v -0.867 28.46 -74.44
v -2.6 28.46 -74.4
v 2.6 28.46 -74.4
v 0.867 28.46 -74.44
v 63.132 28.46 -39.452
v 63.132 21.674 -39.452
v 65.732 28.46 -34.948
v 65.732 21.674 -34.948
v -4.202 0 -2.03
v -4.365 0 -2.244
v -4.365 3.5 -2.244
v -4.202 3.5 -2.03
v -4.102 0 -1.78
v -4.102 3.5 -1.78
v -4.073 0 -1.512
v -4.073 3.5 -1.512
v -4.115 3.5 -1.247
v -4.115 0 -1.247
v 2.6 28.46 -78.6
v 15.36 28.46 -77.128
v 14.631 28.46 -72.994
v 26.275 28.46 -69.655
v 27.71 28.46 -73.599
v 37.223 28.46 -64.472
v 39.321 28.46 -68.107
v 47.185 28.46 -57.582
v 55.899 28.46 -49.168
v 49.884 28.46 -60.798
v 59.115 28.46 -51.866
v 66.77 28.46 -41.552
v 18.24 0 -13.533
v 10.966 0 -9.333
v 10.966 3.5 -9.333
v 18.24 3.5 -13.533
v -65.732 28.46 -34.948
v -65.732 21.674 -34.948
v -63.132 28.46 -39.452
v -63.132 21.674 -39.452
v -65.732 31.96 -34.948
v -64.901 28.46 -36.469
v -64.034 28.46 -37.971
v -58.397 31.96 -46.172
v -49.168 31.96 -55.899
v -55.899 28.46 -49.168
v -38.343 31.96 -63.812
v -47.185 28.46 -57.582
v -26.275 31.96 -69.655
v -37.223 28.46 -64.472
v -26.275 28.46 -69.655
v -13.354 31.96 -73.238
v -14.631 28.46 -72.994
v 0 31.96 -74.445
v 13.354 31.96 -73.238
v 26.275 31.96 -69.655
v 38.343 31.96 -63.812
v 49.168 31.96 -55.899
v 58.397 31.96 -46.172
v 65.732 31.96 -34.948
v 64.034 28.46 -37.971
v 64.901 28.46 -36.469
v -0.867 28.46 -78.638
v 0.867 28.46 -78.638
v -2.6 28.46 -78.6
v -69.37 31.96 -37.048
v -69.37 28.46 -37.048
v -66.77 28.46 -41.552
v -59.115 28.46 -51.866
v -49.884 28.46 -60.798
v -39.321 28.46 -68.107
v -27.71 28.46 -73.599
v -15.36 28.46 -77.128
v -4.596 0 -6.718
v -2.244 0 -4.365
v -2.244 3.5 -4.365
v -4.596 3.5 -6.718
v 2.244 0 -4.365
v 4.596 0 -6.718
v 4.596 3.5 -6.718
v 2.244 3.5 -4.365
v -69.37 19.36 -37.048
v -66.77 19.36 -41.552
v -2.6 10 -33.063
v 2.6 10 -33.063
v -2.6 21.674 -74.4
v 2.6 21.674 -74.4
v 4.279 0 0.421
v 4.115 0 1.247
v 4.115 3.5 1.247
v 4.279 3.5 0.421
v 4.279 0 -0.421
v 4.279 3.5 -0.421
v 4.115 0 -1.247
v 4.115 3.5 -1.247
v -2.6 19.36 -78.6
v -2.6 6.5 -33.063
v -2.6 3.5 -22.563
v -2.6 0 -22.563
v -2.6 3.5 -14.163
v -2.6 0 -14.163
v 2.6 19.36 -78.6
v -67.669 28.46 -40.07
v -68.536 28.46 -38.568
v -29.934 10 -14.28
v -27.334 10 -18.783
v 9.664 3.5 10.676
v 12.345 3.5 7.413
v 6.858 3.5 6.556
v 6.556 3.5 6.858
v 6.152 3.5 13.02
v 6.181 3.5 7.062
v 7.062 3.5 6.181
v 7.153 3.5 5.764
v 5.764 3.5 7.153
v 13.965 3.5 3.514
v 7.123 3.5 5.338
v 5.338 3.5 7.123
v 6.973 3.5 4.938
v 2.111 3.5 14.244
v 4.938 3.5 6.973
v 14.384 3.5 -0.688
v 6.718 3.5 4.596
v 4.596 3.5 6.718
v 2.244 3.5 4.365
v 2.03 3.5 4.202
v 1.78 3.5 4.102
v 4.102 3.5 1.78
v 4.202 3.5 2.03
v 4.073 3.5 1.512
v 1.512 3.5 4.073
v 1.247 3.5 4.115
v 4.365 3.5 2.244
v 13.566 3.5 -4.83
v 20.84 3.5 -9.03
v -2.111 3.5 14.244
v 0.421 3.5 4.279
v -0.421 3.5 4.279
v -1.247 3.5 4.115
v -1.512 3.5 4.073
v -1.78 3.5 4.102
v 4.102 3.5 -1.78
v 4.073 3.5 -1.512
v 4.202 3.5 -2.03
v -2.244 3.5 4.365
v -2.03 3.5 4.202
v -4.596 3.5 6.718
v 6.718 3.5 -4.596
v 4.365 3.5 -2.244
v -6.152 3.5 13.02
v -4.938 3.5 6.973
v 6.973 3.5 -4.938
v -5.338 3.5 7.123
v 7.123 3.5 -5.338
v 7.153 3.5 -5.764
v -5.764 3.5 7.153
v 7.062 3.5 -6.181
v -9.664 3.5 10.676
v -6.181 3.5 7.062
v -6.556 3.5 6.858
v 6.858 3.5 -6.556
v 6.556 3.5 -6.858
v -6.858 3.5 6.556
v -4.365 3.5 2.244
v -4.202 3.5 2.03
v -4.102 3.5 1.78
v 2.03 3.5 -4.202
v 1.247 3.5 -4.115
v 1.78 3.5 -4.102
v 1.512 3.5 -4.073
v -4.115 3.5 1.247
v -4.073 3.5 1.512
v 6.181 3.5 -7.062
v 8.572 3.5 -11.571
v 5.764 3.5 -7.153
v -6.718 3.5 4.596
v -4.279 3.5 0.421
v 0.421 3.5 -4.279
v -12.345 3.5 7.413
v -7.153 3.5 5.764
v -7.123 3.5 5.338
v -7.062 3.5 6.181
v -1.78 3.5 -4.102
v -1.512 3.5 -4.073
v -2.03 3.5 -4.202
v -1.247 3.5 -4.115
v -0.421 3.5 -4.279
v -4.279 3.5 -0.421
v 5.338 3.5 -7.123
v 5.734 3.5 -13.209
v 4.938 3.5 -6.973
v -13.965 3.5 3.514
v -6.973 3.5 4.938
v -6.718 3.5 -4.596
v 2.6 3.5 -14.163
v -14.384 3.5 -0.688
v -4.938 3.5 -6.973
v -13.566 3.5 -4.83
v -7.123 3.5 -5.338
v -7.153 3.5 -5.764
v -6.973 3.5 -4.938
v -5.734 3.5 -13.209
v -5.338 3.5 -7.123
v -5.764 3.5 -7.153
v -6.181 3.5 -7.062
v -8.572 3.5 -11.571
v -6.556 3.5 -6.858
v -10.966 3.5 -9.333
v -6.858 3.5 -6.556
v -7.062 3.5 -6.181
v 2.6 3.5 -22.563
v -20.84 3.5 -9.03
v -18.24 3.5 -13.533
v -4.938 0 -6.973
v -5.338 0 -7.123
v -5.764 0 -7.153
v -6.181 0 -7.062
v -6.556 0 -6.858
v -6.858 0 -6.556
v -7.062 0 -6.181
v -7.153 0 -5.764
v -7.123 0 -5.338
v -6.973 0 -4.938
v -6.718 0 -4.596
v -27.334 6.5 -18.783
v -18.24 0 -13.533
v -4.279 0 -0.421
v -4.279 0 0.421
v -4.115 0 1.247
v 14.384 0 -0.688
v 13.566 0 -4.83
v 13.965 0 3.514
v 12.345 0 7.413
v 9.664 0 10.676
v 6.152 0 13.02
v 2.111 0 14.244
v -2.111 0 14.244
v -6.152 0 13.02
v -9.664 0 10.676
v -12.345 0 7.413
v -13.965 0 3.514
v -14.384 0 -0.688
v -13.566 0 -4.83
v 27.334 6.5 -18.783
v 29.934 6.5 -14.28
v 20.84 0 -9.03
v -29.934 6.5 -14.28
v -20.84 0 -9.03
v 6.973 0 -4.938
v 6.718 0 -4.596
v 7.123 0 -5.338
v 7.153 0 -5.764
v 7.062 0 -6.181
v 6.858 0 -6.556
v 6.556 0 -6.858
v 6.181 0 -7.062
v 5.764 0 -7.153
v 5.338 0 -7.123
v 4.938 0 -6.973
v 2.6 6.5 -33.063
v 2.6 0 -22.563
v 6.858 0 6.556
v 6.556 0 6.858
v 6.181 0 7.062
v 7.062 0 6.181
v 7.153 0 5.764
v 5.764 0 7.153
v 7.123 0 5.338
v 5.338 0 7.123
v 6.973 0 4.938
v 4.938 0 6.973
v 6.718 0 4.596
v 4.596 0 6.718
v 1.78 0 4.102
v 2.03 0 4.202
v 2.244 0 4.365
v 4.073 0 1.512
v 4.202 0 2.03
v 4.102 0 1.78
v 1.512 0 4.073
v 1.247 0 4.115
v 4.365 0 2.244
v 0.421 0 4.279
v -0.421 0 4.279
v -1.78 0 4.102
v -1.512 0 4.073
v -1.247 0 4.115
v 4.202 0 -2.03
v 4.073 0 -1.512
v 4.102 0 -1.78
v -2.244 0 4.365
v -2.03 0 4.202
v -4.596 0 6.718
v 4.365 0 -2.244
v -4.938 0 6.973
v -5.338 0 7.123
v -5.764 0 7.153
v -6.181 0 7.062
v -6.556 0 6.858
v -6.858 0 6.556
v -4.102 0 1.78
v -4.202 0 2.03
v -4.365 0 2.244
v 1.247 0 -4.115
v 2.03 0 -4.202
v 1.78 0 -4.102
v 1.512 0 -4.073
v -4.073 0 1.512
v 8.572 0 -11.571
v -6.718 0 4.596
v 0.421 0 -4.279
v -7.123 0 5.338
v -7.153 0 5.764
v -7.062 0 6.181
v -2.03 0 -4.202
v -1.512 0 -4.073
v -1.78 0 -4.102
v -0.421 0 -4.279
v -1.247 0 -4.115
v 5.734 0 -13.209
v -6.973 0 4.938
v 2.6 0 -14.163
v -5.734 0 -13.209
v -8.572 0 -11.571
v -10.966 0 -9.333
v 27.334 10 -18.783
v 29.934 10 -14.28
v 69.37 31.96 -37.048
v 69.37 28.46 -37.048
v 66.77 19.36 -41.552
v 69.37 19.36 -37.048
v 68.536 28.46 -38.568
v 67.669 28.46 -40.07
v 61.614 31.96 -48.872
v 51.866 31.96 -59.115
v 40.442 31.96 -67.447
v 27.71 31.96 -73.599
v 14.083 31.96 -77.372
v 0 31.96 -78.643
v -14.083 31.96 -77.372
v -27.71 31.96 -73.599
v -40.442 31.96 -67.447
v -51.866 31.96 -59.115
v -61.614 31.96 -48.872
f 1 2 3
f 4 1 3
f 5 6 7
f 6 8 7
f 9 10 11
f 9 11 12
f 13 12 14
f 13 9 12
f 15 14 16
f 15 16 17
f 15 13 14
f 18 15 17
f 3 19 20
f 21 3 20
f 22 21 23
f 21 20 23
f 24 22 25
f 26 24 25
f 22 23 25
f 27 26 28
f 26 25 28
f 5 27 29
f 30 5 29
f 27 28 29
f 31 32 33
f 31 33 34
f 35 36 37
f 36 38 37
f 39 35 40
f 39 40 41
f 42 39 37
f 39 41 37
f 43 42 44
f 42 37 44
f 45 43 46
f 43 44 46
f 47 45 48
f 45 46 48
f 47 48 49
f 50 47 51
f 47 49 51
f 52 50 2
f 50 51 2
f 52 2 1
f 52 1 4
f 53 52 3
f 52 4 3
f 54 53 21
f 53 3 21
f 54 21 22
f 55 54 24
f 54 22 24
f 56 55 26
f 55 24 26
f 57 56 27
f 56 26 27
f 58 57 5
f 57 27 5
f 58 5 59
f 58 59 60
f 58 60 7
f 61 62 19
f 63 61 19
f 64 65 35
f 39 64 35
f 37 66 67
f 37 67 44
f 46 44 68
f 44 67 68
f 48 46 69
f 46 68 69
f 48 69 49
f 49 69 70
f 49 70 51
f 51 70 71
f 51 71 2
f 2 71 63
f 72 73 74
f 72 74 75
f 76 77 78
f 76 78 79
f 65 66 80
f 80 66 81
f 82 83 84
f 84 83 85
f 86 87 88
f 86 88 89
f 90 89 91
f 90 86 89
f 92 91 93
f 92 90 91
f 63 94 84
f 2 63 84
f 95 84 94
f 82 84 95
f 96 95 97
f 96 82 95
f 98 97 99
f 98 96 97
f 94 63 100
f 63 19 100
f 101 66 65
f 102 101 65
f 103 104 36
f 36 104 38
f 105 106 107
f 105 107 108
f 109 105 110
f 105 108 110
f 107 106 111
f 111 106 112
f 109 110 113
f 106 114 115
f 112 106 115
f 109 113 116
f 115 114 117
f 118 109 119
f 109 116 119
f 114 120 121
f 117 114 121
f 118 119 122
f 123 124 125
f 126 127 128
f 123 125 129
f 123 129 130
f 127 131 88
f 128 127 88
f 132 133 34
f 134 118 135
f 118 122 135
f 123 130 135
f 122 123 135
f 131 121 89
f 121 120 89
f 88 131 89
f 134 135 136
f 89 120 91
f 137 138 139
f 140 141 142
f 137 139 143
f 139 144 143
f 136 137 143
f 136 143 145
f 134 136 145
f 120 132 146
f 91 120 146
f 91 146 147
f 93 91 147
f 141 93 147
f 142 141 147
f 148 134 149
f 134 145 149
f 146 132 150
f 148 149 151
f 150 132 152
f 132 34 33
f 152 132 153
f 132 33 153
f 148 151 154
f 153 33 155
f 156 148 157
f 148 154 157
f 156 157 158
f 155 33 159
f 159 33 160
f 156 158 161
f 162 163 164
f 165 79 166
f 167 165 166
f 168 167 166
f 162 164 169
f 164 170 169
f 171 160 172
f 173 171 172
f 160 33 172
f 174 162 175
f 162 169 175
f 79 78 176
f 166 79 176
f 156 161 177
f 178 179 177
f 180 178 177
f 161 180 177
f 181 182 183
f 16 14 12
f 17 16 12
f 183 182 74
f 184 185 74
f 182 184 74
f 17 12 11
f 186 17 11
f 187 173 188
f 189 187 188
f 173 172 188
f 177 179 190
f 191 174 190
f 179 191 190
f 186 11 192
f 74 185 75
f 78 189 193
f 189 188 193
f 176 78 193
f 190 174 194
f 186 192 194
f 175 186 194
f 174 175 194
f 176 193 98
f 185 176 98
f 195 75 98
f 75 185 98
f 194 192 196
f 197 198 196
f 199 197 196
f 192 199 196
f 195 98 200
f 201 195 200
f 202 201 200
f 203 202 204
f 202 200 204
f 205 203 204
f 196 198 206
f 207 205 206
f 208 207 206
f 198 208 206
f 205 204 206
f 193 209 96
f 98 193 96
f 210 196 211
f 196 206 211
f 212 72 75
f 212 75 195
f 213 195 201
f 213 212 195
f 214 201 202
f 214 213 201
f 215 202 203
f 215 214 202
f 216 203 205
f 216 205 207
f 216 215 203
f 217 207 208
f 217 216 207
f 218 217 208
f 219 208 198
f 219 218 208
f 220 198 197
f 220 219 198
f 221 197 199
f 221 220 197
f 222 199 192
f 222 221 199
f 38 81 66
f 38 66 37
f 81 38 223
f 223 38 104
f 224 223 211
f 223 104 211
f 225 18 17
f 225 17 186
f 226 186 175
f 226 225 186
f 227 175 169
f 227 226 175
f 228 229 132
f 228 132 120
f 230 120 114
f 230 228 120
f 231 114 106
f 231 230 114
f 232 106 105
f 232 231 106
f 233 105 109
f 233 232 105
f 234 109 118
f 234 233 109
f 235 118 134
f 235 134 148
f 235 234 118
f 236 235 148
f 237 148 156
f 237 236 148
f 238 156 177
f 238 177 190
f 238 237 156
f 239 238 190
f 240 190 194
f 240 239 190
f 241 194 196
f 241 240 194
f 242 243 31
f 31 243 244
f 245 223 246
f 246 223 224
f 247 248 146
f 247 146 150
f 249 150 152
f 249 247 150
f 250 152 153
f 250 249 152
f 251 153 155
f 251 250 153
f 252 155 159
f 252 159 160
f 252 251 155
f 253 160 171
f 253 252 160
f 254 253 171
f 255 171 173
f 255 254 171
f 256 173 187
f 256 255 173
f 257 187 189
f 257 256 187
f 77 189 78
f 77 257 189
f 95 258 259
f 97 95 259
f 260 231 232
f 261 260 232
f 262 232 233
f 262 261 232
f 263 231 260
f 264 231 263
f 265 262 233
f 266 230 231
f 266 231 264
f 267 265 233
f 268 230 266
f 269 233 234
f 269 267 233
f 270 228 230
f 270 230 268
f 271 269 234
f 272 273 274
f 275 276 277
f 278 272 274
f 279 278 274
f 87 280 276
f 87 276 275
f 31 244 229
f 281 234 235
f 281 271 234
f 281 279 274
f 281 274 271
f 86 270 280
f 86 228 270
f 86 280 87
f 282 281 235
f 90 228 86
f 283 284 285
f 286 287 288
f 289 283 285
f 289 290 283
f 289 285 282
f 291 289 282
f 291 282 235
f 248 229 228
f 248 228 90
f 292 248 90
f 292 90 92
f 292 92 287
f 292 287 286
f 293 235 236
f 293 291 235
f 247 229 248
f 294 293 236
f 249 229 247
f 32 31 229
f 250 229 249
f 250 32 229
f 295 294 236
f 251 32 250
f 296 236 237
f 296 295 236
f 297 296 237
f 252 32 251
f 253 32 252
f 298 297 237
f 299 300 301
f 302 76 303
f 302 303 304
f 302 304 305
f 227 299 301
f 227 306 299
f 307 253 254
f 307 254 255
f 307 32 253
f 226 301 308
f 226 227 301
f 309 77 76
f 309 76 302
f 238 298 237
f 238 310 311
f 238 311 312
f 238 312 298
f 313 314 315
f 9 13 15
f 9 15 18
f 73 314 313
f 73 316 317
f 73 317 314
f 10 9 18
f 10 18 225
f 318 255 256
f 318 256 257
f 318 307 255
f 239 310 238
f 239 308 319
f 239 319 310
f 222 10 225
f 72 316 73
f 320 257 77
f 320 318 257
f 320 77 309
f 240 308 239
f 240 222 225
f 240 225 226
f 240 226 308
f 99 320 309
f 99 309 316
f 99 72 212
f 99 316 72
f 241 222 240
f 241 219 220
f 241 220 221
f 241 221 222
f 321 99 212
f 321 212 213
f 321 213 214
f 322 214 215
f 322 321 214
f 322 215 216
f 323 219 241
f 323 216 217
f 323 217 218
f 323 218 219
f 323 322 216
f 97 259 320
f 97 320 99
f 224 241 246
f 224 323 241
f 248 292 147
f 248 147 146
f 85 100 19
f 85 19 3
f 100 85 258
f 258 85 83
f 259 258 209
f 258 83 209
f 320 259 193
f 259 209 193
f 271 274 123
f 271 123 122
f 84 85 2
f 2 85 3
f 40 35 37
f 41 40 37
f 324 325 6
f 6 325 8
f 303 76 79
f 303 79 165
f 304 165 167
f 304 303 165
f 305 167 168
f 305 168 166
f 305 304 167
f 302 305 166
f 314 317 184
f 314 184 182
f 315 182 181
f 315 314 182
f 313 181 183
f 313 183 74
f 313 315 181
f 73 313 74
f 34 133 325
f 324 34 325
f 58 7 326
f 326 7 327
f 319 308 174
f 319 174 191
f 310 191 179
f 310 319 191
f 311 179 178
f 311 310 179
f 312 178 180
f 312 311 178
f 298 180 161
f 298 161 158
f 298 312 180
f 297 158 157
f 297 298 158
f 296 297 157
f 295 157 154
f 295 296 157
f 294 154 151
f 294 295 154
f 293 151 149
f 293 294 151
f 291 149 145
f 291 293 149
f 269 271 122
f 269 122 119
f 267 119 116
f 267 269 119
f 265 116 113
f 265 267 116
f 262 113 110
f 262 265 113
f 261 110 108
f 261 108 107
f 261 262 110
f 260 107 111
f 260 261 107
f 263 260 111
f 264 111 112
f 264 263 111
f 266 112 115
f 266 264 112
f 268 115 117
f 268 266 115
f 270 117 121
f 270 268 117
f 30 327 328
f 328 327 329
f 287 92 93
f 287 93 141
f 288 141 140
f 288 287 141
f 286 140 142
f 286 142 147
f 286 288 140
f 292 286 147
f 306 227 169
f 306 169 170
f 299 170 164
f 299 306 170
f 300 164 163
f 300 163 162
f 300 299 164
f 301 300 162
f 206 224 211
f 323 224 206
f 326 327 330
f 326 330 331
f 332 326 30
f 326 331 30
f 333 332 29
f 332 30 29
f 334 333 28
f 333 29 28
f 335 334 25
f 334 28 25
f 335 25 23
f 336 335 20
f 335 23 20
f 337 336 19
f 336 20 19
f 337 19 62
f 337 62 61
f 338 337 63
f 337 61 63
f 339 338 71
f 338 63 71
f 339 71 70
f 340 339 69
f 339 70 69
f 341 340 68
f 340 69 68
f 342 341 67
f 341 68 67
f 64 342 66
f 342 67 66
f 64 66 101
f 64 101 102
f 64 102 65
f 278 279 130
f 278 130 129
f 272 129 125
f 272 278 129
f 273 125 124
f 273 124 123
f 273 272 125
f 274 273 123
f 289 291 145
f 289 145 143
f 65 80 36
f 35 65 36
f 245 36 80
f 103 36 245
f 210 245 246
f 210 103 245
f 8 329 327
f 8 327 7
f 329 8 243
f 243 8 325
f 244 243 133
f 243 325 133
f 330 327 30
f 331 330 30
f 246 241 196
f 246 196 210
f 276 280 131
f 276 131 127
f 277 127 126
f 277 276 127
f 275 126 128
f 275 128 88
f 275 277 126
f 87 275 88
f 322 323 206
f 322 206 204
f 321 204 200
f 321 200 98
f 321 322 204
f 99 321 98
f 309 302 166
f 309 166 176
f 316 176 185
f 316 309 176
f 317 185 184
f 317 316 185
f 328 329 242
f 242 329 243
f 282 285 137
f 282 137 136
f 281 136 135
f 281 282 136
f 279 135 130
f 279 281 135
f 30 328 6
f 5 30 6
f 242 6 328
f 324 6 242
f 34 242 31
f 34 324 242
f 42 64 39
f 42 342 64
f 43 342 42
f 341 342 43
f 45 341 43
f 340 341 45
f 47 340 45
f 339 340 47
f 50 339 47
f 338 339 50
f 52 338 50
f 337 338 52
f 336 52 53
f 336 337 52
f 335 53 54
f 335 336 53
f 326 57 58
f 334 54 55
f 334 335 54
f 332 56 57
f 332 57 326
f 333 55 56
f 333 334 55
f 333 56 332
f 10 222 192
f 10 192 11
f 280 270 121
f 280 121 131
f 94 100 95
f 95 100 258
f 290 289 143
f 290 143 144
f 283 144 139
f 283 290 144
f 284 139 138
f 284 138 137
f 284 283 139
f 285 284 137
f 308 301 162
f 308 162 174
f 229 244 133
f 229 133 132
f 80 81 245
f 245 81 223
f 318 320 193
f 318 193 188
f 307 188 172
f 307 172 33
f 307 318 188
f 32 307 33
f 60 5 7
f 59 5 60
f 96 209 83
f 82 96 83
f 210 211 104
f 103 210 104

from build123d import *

# Parameters (mm, degrees)
EXTRUDE_1_DEPTH          = 3.5
EXTRUDE_2_DEPTH          = 2.6
PATTERN_CIRCULAR_1_COUNT = 2
PATTERN_CIRCULAR_1_ANGLE = 60
PATTERN_CIRCULAR_2_COUNT = 2
PATTERN_CIRCULAR_2_ANGLE = 60
EXTRUDE_3_DEPTH          = 3.5


with BuildPart() as part:
    # 草图1 → 凸台-拉伸1 (new body)
    with BuildSketch(Plane(origin=(0, 0, 0), x_dir=(1, 0, 0), z_dir=(0, 1, 0))):
        with BuildLine():
            Line((-2.6, 22.563332941), (2.6, 22.563332941))
            Line((2.6, 22.563332941), (2.6, 14.163332941))
            ThreePointArc((2.6, 14.163332941), (7.2, 12.470765814), (10.965806129, 9.33333252))
            Line((10.965806129, 9.33333252), (18.240419521, 13.53333252))
            Line((18.240419521, 13.53333252), (20.840419521, 9.030000421))
            Line((20.840419521, 9.030000421), (13.565806129, 4.830000421))
            ThreePointArc((13.565806129, 4.830000421), (0, -14.4), (-13.565806129, 4.830000421))
            Line((-13.565806129, 4.830000421), (-20.840419521, 9.030000421))
            Line((-20.840419521, 9.030000421), (-18.240419521, 13.53333252))
            Line((-18.240419521, 13.53333252), (-10.965806129, 9.33333252))
            ThreePointArc((-10.965806129, 9.33333252), (-7.2, 12.470765814), (-2.6, 14.163332941))
            Line((-2.6, 14.163332941), (-2.6, 22.563332941))
        make_face()
        with BuildLine():
            Line((4.596194078, 6.717514421), (2.243882157, 4.3652025))
            ThreePointArc((2.243882157, 4.3652025), (1.77992131, 4.102319563), (1.246817757, 4.115269794))
            ThreePointArc((1.246817757, 4.115269794), (0, 4.3), (-1.246817757, 4.115269794))
            ThreePointArc((-1.246817757, 4.115269794), (-1.77992131, 4.102319563), (-2.243882157, 4.3652025))
            Line((-2.243882157, 4.3652025), (-4.596194078, 6.717514421))
            ThreePointArc((-4.596194078, 6.717514421), (-6.717514421, 6.717514421), (-6.717514421, 4.596194078))
            Line((-6.717514421, 4.596194078), (-4.3652025, 2.243882157))
            ThreePointArc((-4.3652025, 2.243882157), (-4.102319563, 1.77992131), (-4.115269794, 1.246817757))
            ThreePointArc((-4.115269794, 1.246817757), (-4.3, 0), (-4.115269794, -1.246817757))
            ThreePointArc((-4.115269794, -1.246817757), (-4.102319563, -1.77992131), (-4.3652025, -2.243882157))
            Line((-4.3652025, -2.243882157), (-6.717514421, -4.596194078))
            ThreePointArc((-6.717514421, -4.596194078), (-6.717514421, -6.717514421), (-4.596194078, -6.717514421))
            Line((-4.596194078, -6.717514421), (-2.243882157, -4.3652025))
            ThreePointArc((-2.243882157, -4.3652025), (-1.77992131, -4.102319563), (-1.246817757, -4.115269794))
            ThreePointArc((-1.246817757, -4.115269794), (0, -4.3), (1.246817757, -4.115269794))
            ThreePointArc((1.246817757, -4.115269794), (1.77992131, -4.102319563), (2.243882157, -4.3652025))
            Line((2.243882157, -4.3652025), (4.596194078, -6.717514421))
            ThreePointArc((4.596194078, -6.717514421), (6.717514421, -6.717514421), (6.717514421, -4.596194078))
            Line((6.717514421, -4.596194078), (4.3652025, -2.243882157))
            ThreePointArc((4.3652025, -2.243882157), (4.102319563, -1.77992131), (4.115269794, -1.246817757))
            ThreePointArc((4.115269794, -1.246817757), (4.3, 0), (4.115269794, 1.246817757))
            ThreePointArc((4.115269794, 1.246817757), (4.102319563, 1.77992131), (4.3652025, 2.243882157))
            Line((4.3652025, 2.243882157), (6.717514421, 4.596194078))
            ThreePointArc((6.717514421, 4.596194078), (6.717514421, 6.717514421), (4.596194078, 6.717514421))
        make_face(mode=Mode.SUBTRACT)
    extrude(amount=EXTRUDE_1_DEPTH)

    # 草图2 → 凸台-拉伸2 (add, symmetric)
    with BuildSketch(Plane(origin=(0, 0, 0), x_dir=(0, 0, -1), z_dir=(1, 0, 0))):
        Polygon((22.563332941, 3.5), (33.063332941, 10), (74.4, 21.673878936), (74.4, 28.46), (78.6, 28.46), (78.6, 19.36), (33.063332941, 6.5), (22.563332941, 0), align=None)
    extrude_2 = extrude(amount=EXTRUDE_2_DEPTH, both=True)

    # 阵列(圆周)1: 凸台-拉伸2 ×2 about axis
    pattern_circular_1_axis = Axis((0, 3.5, 0), (0, 1, 0))
    for i in range(1, PATTERN_CIRCULAR_1_COUNT):
        add(extrude_2.rotate(pattern_circular_1_axis, i * PATTERN_CIRCULAR_1_ANGLE / (PATTERN_CIRCULAR_1_COUNT - 1)))

    # 阵列(圆周)2: 凸台-拉伸2 ×2 about axis
    pattern_circular_2_axis = Axis((0, 3.5, 0), (0, -1, 0))
    for i in range(1, PATTERN_CIRCULAR_2_COUNT):
        add(extrude_2.rotate(pattern_circular_2_axis, i * PATTERN_CIRCULAR_2_ANGLE / (PATTERN_CIRCULAR_2_COUNT - 1)))

    # 草图3 → 凸台-拉伸3 (add)
    with BuildSketch(Plane(origin=(0, 28.46, 0), x_dir=(1, 0, 0), z_dir=(0, 1, 0))):
        with BuildLine():
            Line((-69.369596737, 37.04833395), (-65.732290042, 34.94833395))
            ThreePointArc((-65.732290042, 34.94833395), (0, 74.445416246), (65.732290042, 34.94833395))
            Line((65.732290042, 34.94833395), (69.369596737, 37.04833395))
            ThreePointArc((69.369596737, 37.04833395), (0, 78.642990787), (-69.369596737, 37.04833395))
        make_face()
    extrude(amount=EXTRUDE_3_DEPTH)


solid = part.part
